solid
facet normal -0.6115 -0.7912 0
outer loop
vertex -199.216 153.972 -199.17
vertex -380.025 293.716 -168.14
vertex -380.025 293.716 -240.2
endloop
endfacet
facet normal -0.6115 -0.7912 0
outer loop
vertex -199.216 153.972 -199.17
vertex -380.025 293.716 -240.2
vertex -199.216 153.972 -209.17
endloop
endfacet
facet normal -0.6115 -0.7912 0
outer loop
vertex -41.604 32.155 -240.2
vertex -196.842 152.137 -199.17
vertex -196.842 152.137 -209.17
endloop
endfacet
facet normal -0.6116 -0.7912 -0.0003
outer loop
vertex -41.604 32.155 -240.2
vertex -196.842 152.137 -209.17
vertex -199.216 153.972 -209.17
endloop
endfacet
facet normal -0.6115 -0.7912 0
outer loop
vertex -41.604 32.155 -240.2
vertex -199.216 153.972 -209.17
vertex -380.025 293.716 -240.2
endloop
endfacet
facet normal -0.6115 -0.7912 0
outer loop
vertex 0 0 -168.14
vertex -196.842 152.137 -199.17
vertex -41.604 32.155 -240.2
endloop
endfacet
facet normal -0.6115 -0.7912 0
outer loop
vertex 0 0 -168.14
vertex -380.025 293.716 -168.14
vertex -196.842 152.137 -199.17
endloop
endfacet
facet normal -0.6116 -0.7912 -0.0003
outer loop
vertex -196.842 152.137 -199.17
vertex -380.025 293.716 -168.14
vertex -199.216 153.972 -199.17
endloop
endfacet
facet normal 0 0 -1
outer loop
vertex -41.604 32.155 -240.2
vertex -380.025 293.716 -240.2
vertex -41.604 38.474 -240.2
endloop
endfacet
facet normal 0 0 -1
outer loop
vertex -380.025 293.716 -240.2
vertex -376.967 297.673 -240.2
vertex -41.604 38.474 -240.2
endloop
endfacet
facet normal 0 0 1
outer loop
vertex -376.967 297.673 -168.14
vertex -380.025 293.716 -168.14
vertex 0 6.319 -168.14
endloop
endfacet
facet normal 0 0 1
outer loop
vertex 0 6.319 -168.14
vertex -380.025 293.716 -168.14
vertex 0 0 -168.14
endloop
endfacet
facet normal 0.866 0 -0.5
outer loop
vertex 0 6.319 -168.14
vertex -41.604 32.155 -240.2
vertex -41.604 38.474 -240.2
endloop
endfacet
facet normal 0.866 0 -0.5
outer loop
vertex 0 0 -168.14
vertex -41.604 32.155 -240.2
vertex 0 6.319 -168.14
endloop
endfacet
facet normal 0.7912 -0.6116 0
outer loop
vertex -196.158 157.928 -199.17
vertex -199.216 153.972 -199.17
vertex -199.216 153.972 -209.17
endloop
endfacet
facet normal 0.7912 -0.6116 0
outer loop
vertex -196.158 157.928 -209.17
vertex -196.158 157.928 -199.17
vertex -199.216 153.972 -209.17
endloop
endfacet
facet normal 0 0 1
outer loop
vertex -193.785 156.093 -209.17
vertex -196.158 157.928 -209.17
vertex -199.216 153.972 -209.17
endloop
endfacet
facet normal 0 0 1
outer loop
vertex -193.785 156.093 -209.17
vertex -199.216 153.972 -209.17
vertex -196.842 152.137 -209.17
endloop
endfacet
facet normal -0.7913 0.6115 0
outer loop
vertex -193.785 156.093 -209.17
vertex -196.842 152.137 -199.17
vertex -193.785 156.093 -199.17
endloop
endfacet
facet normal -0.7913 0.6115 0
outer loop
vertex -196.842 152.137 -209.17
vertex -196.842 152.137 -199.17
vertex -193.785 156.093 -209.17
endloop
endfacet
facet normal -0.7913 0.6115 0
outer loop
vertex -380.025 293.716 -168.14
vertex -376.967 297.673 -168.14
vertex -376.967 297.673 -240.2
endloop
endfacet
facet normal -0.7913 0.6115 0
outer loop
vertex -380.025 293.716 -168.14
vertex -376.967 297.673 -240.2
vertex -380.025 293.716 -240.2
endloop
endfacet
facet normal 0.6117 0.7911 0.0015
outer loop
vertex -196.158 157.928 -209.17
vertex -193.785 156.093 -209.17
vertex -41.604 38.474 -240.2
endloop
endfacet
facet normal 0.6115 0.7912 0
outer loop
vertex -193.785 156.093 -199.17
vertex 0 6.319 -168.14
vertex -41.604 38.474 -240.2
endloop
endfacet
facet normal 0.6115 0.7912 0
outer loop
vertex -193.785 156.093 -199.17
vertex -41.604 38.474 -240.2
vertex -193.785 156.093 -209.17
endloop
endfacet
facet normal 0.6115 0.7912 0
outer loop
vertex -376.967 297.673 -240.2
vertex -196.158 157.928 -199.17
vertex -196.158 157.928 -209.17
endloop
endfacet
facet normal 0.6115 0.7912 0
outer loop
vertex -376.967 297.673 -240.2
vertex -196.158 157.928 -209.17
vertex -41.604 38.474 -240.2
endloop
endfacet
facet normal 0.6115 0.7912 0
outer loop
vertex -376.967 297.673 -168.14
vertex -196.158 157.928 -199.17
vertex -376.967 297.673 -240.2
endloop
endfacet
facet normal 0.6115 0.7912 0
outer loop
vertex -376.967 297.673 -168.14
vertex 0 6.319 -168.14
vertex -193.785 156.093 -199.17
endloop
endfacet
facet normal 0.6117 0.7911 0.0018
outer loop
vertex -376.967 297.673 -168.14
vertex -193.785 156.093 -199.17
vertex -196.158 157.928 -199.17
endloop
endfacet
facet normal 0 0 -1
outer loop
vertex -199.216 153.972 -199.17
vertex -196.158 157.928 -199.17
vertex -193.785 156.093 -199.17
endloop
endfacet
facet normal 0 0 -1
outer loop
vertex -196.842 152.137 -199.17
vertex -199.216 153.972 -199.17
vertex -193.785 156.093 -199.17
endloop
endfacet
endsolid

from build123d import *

# Parameters (mm, degrees)
BOSS_EXTRUDE1_DEPTH     = 240.2
CUT_EXTRUDE3_DEPTH      = 540.188032545
CUT_EXTRUDE3_DEPTH_BACK = 540.188032545
SKETCH2_OUTSIDE_W       = 932.224
SKETCH2_OUTSIDE_H       = 412.374
SKETCH2_OUTSIDE_W_2     = 760.049325768
SKETCH2_OUTSIDE_H_2     = 72.06
CUT_EXTRUDE4_DEPTH      = 540.188032545
CUT_EXTRUDE5_DEPTH      = 540.182188788
CUT_EXTRUDE5_DEPTH_BACK = 540.182188788
SKETCH4_W               = 3
SKETCH4_H               = 10


with BuildPart() as part:
    # Sketch1 → Boss-Extrude1 (new body)
    with BuildSketch(Plane.XY):
        Polygon((0, 0), (380.024662884, 293.716437401), (376.967027683, 297.672555066), (0, 6.319326703), (-376.967027683, 297.672555066), (-380.024662884, 293.716437401), align=None)
    extrude(amount=-BOSS_EXTRUDE1_DEPTH)

    # Sketch2 outside → Cut-Extrude3 (cut, two sides: drawn at the far end of the back side and taken through both)
    with BuildSketch(Plane(origin=(0, 0, 0), x_dir=(1, 0, 0), z_dir=(0, 1, 0)).offset(-CUT_EXTRUDE3_DEPTH_BACK)):
        with Locations((0, 120.1)):
            Rectangle(SKETCH2_OUTSIDE_W, SKETCH2_OUTSIDE_H)
        with Locations((0, 204.17)):
            Rectangle(SKETCH2_OUTSIDE_W_2, SKETCH2_OUTSIDE_H_2, mode=Mode.SUBTRACT)
    extrude(amount=CUT_EXTRUDE3_DEPTH + CUT_EXTRUDE3_DEPTH_BACK, mode=Mode.SUBTRACT)

    # Sketch3 → Cut-Extrude4 (cut, through all)
    with BuildSketch(Plane(origin=(0, 0, 0), x_dir=(1, 0, 0), z_dir=(0, 1, 0))):
        Polygon((41.603860398, 240.2), (0, 168.14), (380.024662884, 168.14), (380.024662884, 240.2), align=None)
        Polygon((41.603860398, 240.2), (-41.603860398, 240.2), (0, 168.14), align=None)
    extrude(amount=CUT_EXTRUDE4_DEPTH, mode=Mode.SUBTRACT)

    # Sketch4 → Cut-Extrude5 (cut, two sides: drawn at the far end of the back side and taken through both)
    with BuildSketch(Plane(origin=(3.057635201, 3.956117665, 0), x_dir=(0.7912235329674936, -0.6115270401858268, 0), z_dir=(0.6115270401858268, 0.7912235329674936, 0)).offset(-CUT_EXTRUDE5_DEPTH_BACK)):
        with Locations((-250.282219577, 204.17)):
            Rectangle(SKETCH4_W, SKETCH4_H)
    extrude(amount=CUT_EXTRUDE5_DEPTH + CUT_EXTRUDE5_DEPTH_BACK, mode=Mode.SUBTRACT)


solid = part.part
